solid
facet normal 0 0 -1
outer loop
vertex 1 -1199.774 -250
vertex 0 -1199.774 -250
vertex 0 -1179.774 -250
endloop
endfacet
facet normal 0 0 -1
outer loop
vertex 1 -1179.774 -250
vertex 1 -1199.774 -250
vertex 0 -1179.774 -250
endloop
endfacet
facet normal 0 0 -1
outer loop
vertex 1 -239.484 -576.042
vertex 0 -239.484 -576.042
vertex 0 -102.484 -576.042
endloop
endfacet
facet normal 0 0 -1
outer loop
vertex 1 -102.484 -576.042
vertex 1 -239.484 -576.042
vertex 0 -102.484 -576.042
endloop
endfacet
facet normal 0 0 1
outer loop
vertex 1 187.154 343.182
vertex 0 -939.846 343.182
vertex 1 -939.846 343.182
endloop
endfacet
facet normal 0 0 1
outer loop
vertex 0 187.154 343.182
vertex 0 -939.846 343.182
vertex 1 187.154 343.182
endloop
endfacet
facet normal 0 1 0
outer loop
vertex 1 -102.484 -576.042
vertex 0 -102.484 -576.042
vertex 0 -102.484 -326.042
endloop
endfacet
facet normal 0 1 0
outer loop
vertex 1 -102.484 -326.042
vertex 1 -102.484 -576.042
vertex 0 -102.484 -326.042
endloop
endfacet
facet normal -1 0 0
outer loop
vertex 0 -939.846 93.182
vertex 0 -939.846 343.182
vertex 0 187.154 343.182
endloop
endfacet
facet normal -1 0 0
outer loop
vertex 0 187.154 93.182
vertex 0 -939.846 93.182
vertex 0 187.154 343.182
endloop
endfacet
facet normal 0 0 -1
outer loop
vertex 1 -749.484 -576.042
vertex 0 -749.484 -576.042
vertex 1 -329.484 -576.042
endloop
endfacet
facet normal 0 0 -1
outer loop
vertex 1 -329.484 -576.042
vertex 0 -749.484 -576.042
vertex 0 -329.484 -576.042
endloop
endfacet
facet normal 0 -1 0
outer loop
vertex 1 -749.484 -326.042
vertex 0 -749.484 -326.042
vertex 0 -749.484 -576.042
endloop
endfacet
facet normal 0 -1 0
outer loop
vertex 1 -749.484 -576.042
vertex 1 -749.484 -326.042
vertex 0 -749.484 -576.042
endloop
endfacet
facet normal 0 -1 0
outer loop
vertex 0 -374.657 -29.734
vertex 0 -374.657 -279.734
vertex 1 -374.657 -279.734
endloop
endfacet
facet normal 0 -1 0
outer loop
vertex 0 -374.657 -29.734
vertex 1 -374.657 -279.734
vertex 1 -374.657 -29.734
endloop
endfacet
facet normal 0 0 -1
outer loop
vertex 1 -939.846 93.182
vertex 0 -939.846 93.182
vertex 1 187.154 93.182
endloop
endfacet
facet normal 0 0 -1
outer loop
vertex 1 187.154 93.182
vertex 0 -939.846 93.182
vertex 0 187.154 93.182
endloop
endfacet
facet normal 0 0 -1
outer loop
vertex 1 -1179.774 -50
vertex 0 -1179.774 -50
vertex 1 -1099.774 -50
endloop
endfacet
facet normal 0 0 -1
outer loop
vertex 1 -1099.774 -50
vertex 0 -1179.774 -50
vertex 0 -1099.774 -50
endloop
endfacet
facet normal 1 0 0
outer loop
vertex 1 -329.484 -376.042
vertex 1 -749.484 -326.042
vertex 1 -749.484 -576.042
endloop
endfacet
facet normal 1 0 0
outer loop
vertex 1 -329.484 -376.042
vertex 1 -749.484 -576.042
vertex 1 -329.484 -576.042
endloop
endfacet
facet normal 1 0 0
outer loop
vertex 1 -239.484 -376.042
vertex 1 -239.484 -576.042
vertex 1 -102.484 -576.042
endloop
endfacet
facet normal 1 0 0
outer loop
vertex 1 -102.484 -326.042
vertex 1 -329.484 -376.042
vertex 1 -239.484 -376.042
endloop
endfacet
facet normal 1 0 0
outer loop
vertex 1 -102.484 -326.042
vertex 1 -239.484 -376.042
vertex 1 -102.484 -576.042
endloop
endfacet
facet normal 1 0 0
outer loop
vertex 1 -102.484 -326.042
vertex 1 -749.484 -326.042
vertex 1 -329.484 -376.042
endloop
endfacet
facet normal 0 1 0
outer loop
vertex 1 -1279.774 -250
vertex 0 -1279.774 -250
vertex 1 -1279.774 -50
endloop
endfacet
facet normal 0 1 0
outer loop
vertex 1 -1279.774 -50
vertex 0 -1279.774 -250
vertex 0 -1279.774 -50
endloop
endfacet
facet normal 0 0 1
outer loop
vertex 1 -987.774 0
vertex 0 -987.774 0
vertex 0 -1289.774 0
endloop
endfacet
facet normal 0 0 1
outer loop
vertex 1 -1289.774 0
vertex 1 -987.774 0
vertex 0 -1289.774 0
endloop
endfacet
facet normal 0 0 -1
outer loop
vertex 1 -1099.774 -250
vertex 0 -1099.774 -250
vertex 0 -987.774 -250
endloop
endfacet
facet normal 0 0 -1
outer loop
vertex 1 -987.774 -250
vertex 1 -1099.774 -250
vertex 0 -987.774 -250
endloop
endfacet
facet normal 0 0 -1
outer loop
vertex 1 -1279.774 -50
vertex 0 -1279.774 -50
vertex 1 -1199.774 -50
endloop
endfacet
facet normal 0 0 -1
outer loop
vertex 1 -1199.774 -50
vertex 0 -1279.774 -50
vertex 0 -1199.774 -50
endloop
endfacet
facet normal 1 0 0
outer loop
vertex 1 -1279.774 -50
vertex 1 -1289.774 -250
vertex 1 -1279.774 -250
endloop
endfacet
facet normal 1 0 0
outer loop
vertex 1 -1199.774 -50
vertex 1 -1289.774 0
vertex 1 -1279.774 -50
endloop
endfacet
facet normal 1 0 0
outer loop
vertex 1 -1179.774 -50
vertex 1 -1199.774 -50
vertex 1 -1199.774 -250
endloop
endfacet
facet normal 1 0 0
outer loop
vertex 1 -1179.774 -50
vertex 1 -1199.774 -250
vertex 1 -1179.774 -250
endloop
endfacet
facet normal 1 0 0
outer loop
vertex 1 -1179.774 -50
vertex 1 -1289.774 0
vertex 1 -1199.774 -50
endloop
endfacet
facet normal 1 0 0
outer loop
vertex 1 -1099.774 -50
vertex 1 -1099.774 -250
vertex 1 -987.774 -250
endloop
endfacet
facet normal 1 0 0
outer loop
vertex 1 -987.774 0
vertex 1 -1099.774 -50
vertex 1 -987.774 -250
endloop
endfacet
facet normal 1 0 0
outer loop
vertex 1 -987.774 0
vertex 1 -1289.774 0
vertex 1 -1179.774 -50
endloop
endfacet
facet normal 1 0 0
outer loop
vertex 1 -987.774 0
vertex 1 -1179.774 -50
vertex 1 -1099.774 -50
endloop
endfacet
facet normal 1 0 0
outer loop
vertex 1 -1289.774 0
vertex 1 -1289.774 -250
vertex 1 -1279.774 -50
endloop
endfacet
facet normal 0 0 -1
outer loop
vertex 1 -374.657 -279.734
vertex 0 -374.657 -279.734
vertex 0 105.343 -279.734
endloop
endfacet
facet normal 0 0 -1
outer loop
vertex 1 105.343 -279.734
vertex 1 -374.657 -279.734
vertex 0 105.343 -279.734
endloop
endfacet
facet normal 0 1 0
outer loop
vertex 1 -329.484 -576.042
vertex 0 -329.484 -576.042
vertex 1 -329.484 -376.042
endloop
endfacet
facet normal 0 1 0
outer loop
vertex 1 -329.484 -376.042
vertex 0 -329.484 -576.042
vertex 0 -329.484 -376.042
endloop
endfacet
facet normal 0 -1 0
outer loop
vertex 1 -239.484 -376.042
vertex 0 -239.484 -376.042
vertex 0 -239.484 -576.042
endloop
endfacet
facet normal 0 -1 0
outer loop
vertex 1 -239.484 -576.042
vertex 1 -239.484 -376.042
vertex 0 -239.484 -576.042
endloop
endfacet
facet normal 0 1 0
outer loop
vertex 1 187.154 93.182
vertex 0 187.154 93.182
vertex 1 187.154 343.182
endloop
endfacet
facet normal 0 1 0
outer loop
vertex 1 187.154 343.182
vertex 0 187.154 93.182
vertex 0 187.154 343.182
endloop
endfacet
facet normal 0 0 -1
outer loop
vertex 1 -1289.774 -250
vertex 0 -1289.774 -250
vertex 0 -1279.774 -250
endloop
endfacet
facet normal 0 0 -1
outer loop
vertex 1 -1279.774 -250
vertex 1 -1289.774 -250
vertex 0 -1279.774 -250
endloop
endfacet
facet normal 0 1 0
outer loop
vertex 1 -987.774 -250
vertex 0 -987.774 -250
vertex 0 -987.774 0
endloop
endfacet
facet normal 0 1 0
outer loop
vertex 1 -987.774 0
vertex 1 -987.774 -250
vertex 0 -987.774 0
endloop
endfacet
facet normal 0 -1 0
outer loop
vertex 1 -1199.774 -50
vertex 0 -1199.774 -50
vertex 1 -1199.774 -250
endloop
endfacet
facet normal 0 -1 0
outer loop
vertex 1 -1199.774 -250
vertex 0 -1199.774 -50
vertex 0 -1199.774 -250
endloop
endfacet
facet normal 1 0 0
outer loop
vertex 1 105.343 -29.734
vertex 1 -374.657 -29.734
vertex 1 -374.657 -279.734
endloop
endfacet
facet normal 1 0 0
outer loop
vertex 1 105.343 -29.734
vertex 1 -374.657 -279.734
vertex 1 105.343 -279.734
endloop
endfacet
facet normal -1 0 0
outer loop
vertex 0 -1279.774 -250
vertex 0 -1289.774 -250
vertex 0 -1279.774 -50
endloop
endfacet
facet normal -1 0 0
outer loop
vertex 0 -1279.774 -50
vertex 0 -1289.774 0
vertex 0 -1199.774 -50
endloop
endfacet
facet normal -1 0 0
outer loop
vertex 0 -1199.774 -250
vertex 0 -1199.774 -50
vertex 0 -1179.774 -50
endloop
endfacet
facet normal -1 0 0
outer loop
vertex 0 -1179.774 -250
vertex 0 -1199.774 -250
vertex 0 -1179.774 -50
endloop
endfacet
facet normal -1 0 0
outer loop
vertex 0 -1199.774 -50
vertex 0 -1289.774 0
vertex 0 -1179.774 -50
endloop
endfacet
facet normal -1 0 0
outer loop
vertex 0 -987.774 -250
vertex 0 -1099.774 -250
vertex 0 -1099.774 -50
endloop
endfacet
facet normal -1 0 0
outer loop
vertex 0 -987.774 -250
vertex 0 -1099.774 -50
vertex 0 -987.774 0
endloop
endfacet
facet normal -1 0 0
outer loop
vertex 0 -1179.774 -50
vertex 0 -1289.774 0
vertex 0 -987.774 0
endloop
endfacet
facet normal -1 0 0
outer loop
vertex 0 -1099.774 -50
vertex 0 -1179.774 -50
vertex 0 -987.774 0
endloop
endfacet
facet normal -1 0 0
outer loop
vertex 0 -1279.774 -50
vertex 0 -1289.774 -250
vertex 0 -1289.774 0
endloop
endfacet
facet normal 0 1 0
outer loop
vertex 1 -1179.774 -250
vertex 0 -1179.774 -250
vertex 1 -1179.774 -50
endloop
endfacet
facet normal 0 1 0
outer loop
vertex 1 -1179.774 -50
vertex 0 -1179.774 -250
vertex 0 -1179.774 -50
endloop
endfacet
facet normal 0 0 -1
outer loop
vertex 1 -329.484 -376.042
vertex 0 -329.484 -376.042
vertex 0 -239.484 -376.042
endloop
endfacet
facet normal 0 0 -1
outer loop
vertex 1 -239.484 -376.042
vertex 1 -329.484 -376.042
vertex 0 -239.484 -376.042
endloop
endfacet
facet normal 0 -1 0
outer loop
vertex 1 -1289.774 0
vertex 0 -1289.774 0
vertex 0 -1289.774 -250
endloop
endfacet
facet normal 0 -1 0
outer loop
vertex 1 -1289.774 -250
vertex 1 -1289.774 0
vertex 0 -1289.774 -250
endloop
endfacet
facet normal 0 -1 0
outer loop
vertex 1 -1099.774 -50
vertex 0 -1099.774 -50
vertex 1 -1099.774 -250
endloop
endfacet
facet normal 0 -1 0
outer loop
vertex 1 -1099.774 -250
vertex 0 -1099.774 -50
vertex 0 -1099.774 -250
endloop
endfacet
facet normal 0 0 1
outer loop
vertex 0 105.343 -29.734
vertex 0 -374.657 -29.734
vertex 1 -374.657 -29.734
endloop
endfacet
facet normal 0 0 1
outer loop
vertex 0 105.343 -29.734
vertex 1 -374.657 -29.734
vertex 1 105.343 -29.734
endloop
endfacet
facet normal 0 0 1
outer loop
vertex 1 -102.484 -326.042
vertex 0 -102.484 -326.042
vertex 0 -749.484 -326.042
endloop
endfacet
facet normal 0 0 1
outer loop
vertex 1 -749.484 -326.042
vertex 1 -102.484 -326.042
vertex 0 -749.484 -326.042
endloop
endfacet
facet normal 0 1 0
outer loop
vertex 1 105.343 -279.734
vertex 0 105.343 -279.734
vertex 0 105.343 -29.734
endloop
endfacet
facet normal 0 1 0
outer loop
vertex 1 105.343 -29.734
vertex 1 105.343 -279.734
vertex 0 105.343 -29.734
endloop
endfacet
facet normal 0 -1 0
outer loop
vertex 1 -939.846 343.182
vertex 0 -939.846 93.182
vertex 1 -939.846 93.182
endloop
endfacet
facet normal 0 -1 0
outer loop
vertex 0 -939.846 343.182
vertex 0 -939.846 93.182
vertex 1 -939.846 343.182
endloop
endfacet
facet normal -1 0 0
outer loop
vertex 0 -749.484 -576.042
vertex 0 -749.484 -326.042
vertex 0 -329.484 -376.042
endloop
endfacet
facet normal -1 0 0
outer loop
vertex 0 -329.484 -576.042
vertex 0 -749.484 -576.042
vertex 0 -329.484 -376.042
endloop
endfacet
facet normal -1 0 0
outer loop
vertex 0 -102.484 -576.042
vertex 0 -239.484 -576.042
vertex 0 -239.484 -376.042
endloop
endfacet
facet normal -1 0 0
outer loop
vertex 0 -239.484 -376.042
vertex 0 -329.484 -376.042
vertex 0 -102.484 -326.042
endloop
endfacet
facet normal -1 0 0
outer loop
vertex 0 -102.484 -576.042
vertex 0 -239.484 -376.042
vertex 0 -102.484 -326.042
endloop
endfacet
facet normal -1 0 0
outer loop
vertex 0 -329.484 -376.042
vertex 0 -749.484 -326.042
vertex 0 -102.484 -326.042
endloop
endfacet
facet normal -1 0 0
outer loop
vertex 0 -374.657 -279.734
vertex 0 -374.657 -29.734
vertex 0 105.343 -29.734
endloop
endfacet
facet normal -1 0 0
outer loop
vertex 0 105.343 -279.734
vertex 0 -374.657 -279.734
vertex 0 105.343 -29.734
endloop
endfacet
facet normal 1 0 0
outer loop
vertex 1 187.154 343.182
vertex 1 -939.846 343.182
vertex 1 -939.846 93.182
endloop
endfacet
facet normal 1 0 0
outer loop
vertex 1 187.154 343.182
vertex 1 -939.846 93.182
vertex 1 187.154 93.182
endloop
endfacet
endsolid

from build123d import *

# Parameters (mm, degrees)
F0_W     = 1127
F0_H     = 250
F0_W_2   = 480
F1_DEPTH = 1


with BuildPart() as f1:
    # F0 (on Right) → F1 (new body)
    with BuildSketch(Plane.YZ):
        with Locations((-376.345618, 218.181528)):
            Rectangle(F0_W, F0_H)
        Polygon((-987.774299, 0), (-1289.774299, 0), (-1289.774299, -250), (-1279.774299, -250), (-1279.774299, -50), (-1199.774299, -50), (-1199.774299, -250), (-1179.774299, -250), (-1179.774299, -50), (-1099.774299, -50), (-1099.774299, -250), (-987.774299, -250), align=None)
        with Locations((-134.656926, -154.733807)):
            Rectangle(F0_W_2, F0_H)
        Polygon((-102.484159, -326.041937), (-749.484159, -326.041937), (-749.484159, -576.041937), (-329.484159, -576.041937), (-329.484159, -376.041937), (-239.484159, -376.041937), (-239.484159, -576.041937), (-102.484159, -576.041937), align=None)
    extrude(amount=F1_DEPTH)


solid = f1.part
